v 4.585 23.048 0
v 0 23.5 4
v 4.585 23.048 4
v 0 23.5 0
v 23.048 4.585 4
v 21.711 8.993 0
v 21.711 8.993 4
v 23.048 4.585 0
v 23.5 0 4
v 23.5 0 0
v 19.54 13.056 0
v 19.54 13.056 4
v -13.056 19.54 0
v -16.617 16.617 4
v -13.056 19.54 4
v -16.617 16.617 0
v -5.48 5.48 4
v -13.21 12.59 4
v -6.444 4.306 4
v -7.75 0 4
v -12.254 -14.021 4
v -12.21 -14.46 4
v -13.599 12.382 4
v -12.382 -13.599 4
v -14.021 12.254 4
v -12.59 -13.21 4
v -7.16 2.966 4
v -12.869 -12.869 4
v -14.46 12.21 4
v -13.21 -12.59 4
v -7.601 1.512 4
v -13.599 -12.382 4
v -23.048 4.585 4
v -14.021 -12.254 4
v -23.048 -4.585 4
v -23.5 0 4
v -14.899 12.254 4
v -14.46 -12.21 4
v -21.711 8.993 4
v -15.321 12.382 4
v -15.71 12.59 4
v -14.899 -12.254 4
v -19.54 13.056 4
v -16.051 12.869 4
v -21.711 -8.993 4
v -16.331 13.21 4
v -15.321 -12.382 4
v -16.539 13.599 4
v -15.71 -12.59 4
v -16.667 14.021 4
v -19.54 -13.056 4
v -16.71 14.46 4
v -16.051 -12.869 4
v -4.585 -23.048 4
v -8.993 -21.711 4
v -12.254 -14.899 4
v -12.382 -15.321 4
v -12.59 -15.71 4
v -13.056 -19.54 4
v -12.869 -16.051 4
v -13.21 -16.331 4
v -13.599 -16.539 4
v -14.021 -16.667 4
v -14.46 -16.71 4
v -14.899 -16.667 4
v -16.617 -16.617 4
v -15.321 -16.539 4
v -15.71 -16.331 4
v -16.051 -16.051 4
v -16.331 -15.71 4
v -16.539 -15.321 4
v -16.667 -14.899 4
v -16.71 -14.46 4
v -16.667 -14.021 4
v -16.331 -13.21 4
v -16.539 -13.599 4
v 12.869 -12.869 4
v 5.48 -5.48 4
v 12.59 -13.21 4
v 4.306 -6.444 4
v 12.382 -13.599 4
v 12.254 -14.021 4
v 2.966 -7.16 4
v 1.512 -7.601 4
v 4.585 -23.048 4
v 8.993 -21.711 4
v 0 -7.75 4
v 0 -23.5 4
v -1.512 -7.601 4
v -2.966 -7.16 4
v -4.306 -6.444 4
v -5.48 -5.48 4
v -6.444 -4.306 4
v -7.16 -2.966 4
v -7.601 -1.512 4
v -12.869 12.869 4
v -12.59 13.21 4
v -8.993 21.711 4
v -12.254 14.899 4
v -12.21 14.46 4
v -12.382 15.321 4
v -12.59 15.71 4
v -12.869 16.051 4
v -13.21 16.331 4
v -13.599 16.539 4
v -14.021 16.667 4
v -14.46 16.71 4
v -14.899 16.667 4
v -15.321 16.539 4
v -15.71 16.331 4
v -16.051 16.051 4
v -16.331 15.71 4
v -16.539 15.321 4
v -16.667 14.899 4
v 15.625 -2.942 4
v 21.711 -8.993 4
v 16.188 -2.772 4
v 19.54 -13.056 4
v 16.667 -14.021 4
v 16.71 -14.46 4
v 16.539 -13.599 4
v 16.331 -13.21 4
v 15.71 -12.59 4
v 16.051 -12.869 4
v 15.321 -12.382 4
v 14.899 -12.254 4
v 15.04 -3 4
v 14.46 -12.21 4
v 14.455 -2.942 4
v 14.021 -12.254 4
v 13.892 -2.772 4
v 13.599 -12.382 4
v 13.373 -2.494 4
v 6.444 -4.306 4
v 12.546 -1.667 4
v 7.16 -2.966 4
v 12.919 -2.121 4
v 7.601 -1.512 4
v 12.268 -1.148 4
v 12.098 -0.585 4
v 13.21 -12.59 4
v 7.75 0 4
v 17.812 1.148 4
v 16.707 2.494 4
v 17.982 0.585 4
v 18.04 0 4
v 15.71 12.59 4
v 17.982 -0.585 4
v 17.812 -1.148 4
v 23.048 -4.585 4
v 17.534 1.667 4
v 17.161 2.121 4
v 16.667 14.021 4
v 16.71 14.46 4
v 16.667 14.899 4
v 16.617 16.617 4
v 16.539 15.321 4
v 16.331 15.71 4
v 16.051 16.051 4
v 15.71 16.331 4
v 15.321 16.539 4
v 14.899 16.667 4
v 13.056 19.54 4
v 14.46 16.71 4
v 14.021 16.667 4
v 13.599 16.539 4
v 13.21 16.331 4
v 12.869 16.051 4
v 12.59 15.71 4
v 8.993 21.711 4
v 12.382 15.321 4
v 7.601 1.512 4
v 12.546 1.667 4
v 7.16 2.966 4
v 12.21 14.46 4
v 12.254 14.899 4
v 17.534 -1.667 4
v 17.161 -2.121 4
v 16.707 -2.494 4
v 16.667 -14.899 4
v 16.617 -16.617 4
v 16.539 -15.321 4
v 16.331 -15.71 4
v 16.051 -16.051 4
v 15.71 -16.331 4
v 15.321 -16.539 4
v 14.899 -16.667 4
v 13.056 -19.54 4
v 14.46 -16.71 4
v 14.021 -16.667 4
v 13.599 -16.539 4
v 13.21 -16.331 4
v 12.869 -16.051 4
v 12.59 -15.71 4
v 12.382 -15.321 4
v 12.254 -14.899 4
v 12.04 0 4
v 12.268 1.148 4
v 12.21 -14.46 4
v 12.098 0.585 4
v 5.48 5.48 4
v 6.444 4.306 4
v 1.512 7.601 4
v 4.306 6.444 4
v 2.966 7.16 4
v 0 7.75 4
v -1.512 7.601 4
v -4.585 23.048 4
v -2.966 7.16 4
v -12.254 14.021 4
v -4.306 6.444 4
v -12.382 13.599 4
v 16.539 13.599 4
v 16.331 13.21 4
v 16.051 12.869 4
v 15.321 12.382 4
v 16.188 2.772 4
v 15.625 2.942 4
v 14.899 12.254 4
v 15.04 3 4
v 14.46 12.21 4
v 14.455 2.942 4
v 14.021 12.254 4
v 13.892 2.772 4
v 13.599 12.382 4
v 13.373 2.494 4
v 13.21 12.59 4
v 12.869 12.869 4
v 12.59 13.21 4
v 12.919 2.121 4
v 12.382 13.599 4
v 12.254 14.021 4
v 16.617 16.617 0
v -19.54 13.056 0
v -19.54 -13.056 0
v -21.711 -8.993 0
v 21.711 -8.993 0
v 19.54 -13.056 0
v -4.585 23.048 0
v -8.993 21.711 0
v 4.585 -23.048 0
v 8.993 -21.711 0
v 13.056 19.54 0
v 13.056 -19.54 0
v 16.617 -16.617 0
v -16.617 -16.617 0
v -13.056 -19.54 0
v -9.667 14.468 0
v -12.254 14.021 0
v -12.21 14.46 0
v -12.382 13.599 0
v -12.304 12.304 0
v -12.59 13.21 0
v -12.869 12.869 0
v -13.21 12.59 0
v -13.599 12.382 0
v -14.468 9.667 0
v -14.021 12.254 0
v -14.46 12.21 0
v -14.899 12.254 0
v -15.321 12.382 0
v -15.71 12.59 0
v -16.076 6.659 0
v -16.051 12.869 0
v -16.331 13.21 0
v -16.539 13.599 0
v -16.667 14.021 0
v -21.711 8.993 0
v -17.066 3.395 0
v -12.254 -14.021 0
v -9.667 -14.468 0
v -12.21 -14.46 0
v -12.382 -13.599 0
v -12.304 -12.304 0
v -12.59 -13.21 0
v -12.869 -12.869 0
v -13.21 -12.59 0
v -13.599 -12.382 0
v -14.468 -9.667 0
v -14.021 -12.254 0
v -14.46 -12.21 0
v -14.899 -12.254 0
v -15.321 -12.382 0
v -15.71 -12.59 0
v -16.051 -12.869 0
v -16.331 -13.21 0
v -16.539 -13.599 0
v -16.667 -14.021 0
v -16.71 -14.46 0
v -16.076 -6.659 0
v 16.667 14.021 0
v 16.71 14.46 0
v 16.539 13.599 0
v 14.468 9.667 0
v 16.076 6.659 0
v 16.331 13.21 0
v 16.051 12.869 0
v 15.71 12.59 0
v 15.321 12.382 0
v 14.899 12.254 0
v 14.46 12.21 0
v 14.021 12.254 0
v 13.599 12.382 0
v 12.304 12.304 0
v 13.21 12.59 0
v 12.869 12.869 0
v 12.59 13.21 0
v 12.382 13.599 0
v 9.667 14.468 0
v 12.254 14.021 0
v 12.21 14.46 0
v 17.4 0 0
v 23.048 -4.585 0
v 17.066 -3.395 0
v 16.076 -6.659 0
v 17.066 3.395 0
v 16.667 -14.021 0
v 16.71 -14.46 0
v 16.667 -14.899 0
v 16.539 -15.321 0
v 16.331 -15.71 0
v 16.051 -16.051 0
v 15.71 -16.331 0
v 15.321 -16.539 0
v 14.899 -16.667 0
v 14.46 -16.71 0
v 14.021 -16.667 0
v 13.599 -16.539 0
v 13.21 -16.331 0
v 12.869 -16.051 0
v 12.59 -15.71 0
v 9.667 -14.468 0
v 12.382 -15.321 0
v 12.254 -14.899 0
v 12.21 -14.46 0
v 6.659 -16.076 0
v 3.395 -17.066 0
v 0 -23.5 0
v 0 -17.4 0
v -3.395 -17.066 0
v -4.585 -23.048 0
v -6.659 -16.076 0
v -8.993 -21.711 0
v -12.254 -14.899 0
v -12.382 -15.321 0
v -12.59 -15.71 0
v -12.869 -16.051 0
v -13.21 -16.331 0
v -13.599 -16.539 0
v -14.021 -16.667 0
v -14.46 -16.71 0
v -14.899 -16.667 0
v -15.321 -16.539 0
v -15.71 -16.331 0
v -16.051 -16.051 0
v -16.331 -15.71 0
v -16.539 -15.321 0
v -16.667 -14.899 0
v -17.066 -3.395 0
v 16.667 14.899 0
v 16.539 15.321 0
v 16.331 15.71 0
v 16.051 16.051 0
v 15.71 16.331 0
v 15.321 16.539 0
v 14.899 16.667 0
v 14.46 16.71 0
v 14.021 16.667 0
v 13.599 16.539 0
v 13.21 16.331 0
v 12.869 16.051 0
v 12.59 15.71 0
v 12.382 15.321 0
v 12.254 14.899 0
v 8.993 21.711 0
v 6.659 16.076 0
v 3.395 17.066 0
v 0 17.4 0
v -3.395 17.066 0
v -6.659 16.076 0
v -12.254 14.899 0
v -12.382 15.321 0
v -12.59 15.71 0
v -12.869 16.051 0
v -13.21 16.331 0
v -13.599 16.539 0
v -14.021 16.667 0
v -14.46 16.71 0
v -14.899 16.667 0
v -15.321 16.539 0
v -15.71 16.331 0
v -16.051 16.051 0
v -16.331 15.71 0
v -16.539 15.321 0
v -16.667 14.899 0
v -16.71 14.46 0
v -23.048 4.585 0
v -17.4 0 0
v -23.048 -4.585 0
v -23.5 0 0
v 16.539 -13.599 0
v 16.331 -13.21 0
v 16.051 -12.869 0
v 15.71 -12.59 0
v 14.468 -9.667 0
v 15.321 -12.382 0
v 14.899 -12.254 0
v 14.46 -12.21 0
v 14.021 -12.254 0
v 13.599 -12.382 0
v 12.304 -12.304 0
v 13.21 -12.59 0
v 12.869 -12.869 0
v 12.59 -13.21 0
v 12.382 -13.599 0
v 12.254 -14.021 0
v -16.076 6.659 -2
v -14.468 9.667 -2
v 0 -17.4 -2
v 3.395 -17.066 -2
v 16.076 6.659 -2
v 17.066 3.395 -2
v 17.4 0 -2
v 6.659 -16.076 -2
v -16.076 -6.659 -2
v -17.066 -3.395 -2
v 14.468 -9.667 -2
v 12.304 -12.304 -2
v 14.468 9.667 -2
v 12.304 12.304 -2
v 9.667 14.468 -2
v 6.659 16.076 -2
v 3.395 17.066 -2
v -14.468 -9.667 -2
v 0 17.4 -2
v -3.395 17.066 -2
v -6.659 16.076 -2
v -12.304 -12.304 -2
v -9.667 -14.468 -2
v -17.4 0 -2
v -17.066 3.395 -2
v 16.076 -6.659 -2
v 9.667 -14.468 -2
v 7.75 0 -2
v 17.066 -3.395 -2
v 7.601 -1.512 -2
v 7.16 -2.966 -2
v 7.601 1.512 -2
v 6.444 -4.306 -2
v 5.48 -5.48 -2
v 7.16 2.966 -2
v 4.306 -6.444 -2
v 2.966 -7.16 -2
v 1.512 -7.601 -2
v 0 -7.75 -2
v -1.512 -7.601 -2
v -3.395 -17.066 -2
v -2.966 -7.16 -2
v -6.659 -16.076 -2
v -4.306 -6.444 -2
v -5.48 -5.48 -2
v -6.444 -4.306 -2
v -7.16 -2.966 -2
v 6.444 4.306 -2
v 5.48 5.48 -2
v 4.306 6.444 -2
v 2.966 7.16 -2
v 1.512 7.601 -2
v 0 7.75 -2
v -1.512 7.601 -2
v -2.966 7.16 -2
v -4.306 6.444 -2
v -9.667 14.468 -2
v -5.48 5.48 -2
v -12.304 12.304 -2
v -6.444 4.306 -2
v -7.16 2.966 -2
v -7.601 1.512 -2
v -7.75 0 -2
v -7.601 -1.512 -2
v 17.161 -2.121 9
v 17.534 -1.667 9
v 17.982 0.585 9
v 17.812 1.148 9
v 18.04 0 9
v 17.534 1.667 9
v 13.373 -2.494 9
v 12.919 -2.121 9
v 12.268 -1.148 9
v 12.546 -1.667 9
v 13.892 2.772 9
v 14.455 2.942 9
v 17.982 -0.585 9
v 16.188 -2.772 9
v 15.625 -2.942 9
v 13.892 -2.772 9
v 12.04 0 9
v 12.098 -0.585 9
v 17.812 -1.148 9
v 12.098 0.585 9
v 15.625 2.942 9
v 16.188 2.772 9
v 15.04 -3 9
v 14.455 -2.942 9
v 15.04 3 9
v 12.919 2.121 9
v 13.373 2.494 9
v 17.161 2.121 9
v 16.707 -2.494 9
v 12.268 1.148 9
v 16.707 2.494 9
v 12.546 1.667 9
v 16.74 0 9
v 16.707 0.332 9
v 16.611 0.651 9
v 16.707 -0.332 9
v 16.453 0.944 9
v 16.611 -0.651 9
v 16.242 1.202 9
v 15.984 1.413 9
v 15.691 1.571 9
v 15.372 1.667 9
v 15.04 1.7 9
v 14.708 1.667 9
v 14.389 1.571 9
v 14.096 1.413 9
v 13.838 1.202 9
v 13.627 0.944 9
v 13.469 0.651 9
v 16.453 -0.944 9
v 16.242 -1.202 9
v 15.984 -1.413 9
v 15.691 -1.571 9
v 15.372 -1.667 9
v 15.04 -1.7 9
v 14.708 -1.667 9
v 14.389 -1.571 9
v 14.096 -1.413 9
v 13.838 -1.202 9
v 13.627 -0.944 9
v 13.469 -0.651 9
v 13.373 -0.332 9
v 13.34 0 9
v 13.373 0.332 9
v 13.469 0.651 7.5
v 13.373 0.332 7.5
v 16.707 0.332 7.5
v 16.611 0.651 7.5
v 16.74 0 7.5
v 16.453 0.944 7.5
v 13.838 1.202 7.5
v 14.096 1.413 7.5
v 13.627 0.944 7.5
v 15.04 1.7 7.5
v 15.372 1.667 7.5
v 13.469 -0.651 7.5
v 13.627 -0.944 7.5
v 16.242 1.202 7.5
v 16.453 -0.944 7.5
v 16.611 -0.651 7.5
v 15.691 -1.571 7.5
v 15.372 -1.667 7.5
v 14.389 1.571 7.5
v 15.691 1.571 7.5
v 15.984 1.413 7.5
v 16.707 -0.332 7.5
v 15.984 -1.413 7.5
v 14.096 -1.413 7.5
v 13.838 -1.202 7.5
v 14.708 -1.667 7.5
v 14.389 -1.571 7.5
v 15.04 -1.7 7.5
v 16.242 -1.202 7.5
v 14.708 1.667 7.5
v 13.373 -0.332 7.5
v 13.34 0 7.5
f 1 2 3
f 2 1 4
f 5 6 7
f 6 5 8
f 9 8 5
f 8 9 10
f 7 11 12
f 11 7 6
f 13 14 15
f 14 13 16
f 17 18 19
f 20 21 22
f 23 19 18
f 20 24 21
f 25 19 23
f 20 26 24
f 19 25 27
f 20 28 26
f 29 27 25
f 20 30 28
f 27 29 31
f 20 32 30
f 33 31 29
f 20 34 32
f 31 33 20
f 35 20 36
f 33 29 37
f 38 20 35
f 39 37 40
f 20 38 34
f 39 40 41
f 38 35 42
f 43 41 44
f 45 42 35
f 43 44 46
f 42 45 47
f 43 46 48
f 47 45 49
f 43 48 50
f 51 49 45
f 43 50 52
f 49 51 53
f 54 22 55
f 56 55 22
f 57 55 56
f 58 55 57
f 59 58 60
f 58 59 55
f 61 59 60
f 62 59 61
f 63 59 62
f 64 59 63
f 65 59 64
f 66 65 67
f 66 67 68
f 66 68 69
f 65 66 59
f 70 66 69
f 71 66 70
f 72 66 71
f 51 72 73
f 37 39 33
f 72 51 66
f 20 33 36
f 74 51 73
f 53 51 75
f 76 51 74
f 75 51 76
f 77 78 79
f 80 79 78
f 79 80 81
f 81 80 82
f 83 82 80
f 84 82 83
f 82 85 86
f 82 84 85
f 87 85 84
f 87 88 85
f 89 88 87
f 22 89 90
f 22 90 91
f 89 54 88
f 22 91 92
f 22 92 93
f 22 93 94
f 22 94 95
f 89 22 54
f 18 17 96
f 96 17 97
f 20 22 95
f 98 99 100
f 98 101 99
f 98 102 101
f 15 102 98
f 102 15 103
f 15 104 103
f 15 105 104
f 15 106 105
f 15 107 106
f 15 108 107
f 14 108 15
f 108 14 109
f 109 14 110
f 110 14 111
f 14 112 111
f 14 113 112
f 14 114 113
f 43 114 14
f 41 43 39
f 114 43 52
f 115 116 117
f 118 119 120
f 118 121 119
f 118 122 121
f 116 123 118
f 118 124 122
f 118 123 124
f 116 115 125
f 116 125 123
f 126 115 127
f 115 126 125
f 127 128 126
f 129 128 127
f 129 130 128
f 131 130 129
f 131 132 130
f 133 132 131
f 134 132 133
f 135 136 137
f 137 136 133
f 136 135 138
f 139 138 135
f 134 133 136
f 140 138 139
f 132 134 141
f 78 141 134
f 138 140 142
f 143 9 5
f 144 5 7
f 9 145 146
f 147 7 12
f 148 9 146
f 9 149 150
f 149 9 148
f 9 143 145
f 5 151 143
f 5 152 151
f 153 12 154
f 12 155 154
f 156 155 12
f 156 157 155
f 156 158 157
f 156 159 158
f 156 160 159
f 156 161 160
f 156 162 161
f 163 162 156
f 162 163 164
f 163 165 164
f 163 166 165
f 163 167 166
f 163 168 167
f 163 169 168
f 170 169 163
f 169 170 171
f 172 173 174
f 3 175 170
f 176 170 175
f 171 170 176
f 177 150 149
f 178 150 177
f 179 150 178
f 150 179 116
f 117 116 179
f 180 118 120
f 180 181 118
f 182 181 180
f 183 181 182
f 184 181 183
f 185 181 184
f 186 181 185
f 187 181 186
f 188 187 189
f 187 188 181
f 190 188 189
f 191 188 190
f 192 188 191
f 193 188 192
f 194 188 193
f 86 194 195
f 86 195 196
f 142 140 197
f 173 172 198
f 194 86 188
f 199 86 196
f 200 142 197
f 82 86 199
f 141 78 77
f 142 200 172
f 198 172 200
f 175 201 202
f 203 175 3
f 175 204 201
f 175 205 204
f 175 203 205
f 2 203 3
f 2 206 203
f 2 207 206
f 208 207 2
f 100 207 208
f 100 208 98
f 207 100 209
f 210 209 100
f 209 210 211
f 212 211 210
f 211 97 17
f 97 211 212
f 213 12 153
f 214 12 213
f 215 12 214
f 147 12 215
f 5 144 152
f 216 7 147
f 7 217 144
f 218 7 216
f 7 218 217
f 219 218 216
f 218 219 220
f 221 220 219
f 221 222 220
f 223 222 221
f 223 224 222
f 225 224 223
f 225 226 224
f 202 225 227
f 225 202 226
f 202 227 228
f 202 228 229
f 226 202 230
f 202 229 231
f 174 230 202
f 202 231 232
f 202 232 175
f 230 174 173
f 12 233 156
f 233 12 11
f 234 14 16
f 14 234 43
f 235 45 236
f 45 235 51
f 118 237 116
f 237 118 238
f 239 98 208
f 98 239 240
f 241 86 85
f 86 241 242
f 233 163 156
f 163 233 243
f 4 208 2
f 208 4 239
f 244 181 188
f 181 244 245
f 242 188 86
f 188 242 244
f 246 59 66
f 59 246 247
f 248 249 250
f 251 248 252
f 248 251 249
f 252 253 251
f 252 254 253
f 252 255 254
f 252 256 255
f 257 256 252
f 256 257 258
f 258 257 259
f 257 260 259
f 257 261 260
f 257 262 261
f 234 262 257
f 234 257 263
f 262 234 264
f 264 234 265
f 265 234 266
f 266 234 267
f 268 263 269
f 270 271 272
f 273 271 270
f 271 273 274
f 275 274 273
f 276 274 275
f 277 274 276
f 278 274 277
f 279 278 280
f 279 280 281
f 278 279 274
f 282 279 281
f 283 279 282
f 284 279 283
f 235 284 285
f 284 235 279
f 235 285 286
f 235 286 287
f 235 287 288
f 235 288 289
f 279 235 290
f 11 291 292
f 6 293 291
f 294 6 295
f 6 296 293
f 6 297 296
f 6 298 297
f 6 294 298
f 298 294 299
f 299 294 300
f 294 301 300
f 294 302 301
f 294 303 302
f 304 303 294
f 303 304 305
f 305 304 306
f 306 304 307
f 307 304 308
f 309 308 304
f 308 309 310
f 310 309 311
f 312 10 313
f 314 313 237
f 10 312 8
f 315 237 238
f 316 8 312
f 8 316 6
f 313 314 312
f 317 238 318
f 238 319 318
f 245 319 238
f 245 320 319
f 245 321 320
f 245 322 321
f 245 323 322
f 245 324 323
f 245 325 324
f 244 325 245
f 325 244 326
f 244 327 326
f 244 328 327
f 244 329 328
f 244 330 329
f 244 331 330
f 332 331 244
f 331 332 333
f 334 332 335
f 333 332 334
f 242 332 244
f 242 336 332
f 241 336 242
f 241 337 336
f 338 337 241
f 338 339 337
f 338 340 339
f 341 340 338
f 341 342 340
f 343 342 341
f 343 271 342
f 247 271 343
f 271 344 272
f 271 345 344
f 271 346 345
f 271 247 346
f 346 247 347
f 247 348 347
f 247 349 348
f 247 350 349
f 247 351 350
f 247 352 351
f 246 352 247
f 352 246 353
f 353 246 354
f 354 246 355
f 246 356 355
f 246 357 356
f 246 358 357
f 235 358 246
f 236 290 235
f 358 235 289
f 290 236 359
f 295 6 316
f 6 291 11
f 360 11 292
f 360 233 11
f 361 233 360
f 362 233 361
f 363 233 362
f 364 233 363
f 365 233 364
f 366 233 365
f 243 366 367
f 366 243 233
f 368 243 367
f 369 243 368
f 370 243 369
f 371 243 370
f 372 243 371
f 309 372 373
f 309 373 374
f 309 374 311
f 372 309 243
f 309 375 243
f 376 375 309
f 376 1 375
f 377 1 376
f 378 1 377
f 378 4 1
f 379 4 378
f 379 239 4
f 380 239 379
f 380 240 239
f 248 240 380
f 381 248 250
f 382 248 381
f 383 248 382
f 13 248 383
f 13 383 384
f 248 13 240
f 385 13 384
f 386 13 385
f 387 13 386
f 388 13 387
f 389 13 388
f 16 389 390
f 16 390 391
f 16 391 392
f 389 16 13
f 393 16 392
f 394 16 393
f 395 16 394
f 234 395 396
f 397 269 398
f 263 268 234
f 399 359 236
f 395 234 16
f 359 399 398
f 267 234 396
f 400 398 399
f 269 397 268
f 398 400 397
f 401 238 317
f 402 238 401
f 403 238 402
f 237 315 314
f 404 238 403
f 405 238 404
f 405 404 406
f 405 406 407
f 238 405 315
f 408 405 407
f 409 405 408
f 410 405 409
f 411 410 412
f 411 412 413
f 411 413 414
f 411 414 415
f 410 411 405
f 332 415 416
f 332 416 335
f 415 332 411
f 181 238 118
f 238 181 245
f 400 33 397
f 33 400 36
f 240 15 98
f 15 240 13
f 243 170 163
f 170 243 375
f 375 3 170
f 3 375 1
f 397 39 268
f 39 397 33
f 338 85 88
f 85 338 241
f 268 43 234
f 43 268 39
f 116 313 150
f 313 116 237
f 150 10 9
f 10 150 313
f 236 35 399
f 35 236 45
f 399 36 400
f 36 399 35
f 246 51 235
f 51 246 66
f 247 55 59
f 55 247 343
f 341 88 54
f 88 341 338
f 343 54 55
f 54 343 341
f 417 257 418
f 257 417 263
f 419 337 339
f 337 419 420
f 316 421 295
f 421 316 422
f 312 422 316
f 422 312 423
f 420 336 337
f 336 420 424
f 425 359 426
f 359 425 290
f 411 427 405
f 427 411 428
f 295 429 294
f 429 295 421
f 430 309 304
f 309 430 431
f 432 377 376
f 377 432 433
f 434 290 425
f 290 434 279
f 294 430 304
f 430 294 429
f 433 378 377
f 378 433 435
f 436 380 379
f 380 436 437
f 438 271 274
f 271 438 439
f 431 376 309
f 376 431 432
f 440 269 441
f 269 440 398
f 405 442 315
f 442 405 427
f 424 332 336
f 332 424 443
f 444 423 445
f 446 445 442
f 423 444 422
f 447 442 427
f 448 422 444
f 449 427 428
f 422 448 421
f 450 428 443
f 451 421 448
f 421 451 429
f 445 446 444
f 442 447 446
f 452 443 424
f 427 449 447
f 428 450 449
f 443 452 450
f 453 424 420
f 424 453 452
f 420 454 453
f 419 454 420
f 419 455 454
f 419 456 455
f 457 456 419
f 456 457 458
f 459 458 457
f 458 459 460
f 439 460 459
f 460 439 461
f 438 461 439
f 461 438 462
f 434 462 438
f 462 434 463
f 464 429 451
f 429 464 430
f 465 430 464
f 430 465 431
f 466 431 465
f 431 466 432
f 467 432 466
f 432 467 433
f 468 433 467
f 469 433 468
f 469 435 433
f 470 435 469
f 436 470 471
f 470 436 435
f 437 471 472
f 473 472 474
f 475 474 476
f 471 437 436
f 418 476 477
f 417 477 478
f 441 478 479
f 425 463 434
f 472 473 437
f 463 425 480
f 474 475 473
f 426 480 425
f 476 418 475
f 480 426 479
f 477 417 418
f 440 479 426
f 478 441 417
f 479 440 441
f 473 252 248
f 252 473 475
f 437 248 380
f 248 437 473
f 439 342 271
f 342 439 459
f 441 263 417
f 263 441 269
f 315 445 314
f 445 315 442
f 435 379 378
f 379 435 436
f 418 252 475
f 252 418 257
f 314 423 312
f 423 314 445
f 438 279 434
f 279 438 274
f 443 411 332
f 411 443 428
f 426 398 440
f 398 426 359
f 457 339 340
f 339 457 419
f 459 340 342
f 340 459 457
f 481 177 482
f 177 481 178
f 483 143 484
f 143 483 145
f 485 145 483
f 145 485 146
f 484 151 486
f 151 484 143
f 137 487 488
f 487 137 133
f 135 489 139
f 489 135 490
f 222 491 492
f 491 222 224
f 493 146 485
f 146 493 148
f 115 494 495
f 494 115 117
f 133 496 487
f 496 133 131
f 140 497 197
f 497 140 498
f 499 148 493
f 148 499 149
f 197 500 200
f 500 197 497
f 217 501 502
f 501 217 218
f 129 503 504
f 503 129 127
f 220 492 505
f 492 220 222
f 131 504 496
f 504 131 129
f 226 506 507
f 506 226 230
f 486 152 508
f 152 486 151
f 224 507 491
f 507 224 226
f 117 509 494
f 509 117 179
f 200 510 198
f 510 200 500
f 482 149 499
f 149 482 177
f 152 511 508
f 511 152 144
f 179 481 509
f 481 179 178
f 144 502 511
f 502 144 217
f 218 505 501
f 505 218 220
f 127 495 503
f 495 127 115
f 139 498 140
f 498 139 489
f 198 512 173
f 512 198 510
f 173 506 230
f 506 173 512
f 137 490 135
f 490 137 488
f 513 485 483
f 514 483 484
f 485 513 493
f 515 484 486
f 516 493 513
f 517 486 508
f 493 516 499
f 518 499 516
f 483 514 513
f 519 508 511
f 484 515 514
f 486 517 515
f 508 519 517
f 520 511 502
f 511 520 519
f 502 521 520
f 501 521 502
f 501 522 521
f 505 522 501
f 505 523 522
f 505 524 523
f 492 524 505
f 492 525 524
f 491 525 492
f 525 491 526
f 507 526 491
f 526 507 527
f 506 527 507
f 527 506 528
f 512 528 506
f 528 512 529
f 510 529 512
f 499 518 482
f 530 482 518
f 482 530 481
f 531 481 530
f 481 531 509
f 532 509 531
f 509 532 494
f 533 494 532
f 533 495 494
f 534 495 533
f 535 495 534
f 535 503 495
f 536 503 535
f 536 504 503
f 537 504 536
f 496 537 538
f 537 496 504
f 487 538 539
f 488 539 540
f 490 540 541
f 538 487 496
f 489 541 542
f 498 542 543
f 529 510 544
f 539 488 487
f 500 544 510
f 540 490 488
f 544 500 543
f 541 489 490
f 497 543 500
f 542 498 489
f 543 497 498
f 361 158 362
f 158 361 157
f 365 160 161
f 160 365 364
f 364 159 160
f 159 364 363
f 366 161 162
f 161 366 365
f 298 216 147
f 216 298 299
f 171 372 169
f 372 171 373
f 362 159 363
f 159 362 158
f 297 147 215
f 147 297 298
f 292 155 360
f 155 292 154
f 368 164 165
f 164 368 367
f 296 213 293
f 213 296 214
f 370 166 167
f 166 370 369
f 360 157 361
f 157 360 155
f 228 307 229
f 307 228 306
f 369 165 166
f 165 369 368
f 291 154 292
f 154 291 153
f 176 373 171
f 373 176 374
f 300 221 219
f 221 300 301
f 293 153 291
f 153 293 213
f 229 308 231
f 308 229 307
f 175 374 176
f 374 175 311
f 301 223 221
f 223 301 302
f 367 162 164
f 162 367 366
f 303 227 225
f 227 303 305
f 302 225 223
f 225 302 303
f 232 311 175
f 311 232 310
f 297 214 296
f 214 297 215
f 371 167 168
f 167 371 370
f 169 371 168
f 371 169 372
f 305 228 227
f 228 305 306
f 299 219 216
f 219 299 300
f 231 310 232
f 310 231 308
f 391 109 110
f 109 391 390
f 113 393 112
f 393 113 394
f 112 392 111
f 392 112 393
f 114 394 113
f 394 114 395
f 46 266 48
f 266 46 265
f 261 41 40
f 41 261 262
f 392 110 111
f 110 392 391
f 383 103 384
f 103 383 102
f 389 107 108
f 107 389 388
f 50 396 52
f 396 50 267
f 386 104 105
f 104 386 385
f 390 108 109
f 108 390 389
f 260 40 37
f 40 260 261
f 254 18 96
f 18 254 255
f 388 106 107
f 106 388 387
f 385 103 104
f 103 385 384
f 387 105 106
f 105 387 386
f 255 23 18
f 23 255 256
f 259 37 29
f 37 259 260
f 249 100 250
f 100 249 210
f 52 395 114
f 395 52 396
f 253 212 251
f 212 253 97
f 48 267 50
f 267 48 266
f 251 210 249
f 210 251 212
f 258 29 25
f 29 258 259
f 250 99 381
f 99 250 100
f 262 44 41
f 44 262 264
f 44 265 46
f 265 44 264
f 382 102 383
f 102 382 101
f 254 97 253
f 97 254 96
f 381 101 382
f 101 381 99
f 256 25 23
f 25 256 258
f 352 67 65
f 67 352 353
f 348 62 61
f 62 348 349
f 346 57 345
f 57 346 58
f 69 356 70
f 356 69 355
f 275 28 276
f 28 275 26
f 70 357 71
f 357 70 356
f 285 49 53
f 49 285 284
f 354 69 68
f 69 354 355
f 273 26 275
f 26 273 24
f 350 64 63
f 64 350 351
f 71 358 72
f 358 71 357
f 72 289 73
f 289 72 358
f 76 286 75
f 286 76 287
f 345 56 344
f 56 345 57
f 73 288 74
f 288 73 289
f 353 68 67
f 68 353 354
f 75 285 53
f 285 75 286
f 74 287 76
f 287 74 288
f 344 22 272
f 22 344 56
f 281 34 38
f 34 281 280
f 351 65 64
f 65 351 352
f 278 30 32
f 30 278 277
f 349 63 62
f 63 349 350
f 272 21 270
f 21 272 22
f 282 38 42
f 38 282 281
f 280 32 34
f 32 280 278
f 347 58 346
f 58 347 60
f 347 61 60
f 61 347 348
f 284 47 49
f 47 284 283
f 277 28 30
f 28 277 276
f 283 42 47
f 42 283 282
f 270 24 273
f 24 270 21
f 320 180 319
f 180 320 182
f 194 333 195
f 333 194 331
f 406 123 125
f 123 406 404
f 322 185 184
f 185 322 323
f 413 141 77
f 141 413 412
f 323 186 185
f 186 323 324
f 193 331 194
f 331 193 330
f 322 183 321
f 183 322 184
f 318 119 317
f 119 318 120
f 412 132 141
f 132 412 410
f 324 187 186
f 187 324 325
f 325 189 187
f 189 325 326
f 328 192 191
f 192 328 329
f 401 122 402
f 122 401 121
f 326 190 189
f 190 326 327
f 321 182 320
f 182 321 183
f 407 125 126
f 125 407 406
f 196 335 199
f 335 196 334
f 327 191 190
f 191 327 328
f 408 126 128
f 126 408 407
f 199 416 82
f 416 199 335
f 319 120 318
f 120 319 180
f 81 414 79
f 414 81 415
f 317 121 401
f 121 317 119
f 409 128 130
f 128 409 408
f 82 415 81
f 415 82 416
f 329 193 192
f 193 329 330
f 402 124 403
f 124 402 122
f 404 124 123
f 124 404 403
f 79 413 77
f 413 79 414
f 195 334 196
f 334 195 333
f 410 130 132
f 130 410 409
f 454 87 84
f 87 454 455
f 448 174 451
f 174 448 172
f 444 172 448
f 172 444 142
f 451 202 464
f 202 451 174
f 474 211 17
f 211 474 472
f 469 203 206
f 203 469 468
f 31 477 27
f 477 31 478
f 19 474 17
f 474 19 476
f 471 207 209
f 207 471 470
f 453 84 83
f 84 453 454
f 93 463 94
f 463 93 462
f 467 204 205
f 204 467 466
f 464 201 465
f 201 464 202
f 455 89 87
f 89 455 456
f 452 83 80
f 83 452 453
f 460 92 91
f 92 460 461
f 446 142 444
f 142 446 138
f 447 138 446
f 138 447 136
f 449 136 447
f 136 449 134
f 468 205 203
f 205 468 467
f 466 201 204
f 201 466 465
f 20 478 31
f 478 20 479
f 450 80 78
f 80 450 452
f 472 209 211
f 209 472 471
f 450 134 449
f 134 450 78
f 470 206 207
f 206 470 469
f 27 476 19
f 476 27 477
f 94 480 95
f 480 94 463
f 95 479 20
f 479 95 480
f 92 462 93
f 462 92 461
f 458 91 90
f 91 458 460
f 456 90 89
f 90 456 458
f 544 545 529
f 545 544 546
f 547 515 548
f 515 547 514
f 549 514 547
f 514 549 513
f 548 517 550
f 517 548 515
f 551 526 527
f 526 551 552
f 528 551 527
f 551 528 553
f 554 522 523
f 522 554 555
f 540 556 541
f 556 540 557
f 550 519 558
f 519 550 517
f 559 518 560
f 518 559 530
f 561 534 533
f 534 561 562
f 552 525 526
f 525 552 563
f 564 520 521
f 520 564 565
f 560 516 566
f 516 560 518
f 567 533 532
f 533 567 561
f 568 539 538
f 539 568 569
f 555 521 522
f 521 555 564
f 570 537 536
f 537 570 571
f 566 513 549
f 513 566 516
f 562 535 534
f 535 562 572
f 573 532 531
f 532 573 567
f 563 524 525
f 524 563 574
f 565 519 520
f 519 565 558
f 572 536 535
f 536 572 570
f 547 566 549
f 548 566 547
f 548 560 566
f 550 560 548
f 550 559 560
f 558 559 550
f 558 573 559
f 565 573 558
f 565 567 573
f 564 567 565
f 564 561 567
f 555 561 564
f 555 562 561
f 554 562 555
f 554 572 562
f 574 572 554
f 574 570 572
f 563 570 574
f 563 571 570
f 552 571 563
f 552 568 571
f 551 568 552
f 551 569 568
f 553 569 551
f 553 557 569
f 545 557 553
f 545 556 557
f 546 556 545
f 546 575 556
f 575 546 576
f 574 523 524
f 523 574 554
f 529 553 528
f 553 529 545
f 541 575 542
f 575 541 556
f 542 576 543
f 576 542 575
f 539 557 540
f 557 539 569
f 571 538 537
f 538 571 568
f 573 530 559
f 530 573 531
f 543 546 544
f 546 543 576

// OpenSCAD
$fn = 32;

// ----------------------------------------------------------------------
// Retaining cap: 6202 cover, 47 mm, spigot 34.8 mm
// ----------------------------------------------------------------------

// --- parameters (mm) ---
plate_d = 47;             // cover diameter
plate_t = 4;              // cover thickness
boss_d = 34.8;            // spigot that enters the housing
boss_h = 2;               // spigot height
shaft_d = 15.5;           // shaft opening
bolt_d = 4.5;             // bolt clearance
bolt_r = 20.45;           // bolt circle radius
nipple_d = 6;             // grease nipple boss
nipple_h = 5;             // grease nipple boss height

module cover() {
  cylinder(h = plate_t, d = plate_d);
}

module spigot() {
  /* sunk 1 mm into the cover; the spigot sets the overall height */
  translate([0, 0, -boss_h]) cylinder(h = boss_h + 1, d = boss_d);
}

module nipple() {
  translate([plate_d * 0.32, 0, plate_t - 1])
    cylinder(h = nipple_h + 1, d = nipple_d);
}

difference() {
  union() {
    cover();
    spigot();
    nipple();
  }
  for (i = [0 : 3]) rotate([0, 0, 45 + i * 90]) translate([bolt_r, 0, -boss_h - 1])
    cylinder(h = boss_h + plate_t + 2, d = bolt_d);
  translate([0, 0, -boss_h - 1]) cylinder(h = boss_h + plate_t + 2, d = shaft_d);
  translate([plate_d * 0.32, 0, plate_t + nipple_h - 1.5]) cylinder(h = 4, d = 3.4);
}
